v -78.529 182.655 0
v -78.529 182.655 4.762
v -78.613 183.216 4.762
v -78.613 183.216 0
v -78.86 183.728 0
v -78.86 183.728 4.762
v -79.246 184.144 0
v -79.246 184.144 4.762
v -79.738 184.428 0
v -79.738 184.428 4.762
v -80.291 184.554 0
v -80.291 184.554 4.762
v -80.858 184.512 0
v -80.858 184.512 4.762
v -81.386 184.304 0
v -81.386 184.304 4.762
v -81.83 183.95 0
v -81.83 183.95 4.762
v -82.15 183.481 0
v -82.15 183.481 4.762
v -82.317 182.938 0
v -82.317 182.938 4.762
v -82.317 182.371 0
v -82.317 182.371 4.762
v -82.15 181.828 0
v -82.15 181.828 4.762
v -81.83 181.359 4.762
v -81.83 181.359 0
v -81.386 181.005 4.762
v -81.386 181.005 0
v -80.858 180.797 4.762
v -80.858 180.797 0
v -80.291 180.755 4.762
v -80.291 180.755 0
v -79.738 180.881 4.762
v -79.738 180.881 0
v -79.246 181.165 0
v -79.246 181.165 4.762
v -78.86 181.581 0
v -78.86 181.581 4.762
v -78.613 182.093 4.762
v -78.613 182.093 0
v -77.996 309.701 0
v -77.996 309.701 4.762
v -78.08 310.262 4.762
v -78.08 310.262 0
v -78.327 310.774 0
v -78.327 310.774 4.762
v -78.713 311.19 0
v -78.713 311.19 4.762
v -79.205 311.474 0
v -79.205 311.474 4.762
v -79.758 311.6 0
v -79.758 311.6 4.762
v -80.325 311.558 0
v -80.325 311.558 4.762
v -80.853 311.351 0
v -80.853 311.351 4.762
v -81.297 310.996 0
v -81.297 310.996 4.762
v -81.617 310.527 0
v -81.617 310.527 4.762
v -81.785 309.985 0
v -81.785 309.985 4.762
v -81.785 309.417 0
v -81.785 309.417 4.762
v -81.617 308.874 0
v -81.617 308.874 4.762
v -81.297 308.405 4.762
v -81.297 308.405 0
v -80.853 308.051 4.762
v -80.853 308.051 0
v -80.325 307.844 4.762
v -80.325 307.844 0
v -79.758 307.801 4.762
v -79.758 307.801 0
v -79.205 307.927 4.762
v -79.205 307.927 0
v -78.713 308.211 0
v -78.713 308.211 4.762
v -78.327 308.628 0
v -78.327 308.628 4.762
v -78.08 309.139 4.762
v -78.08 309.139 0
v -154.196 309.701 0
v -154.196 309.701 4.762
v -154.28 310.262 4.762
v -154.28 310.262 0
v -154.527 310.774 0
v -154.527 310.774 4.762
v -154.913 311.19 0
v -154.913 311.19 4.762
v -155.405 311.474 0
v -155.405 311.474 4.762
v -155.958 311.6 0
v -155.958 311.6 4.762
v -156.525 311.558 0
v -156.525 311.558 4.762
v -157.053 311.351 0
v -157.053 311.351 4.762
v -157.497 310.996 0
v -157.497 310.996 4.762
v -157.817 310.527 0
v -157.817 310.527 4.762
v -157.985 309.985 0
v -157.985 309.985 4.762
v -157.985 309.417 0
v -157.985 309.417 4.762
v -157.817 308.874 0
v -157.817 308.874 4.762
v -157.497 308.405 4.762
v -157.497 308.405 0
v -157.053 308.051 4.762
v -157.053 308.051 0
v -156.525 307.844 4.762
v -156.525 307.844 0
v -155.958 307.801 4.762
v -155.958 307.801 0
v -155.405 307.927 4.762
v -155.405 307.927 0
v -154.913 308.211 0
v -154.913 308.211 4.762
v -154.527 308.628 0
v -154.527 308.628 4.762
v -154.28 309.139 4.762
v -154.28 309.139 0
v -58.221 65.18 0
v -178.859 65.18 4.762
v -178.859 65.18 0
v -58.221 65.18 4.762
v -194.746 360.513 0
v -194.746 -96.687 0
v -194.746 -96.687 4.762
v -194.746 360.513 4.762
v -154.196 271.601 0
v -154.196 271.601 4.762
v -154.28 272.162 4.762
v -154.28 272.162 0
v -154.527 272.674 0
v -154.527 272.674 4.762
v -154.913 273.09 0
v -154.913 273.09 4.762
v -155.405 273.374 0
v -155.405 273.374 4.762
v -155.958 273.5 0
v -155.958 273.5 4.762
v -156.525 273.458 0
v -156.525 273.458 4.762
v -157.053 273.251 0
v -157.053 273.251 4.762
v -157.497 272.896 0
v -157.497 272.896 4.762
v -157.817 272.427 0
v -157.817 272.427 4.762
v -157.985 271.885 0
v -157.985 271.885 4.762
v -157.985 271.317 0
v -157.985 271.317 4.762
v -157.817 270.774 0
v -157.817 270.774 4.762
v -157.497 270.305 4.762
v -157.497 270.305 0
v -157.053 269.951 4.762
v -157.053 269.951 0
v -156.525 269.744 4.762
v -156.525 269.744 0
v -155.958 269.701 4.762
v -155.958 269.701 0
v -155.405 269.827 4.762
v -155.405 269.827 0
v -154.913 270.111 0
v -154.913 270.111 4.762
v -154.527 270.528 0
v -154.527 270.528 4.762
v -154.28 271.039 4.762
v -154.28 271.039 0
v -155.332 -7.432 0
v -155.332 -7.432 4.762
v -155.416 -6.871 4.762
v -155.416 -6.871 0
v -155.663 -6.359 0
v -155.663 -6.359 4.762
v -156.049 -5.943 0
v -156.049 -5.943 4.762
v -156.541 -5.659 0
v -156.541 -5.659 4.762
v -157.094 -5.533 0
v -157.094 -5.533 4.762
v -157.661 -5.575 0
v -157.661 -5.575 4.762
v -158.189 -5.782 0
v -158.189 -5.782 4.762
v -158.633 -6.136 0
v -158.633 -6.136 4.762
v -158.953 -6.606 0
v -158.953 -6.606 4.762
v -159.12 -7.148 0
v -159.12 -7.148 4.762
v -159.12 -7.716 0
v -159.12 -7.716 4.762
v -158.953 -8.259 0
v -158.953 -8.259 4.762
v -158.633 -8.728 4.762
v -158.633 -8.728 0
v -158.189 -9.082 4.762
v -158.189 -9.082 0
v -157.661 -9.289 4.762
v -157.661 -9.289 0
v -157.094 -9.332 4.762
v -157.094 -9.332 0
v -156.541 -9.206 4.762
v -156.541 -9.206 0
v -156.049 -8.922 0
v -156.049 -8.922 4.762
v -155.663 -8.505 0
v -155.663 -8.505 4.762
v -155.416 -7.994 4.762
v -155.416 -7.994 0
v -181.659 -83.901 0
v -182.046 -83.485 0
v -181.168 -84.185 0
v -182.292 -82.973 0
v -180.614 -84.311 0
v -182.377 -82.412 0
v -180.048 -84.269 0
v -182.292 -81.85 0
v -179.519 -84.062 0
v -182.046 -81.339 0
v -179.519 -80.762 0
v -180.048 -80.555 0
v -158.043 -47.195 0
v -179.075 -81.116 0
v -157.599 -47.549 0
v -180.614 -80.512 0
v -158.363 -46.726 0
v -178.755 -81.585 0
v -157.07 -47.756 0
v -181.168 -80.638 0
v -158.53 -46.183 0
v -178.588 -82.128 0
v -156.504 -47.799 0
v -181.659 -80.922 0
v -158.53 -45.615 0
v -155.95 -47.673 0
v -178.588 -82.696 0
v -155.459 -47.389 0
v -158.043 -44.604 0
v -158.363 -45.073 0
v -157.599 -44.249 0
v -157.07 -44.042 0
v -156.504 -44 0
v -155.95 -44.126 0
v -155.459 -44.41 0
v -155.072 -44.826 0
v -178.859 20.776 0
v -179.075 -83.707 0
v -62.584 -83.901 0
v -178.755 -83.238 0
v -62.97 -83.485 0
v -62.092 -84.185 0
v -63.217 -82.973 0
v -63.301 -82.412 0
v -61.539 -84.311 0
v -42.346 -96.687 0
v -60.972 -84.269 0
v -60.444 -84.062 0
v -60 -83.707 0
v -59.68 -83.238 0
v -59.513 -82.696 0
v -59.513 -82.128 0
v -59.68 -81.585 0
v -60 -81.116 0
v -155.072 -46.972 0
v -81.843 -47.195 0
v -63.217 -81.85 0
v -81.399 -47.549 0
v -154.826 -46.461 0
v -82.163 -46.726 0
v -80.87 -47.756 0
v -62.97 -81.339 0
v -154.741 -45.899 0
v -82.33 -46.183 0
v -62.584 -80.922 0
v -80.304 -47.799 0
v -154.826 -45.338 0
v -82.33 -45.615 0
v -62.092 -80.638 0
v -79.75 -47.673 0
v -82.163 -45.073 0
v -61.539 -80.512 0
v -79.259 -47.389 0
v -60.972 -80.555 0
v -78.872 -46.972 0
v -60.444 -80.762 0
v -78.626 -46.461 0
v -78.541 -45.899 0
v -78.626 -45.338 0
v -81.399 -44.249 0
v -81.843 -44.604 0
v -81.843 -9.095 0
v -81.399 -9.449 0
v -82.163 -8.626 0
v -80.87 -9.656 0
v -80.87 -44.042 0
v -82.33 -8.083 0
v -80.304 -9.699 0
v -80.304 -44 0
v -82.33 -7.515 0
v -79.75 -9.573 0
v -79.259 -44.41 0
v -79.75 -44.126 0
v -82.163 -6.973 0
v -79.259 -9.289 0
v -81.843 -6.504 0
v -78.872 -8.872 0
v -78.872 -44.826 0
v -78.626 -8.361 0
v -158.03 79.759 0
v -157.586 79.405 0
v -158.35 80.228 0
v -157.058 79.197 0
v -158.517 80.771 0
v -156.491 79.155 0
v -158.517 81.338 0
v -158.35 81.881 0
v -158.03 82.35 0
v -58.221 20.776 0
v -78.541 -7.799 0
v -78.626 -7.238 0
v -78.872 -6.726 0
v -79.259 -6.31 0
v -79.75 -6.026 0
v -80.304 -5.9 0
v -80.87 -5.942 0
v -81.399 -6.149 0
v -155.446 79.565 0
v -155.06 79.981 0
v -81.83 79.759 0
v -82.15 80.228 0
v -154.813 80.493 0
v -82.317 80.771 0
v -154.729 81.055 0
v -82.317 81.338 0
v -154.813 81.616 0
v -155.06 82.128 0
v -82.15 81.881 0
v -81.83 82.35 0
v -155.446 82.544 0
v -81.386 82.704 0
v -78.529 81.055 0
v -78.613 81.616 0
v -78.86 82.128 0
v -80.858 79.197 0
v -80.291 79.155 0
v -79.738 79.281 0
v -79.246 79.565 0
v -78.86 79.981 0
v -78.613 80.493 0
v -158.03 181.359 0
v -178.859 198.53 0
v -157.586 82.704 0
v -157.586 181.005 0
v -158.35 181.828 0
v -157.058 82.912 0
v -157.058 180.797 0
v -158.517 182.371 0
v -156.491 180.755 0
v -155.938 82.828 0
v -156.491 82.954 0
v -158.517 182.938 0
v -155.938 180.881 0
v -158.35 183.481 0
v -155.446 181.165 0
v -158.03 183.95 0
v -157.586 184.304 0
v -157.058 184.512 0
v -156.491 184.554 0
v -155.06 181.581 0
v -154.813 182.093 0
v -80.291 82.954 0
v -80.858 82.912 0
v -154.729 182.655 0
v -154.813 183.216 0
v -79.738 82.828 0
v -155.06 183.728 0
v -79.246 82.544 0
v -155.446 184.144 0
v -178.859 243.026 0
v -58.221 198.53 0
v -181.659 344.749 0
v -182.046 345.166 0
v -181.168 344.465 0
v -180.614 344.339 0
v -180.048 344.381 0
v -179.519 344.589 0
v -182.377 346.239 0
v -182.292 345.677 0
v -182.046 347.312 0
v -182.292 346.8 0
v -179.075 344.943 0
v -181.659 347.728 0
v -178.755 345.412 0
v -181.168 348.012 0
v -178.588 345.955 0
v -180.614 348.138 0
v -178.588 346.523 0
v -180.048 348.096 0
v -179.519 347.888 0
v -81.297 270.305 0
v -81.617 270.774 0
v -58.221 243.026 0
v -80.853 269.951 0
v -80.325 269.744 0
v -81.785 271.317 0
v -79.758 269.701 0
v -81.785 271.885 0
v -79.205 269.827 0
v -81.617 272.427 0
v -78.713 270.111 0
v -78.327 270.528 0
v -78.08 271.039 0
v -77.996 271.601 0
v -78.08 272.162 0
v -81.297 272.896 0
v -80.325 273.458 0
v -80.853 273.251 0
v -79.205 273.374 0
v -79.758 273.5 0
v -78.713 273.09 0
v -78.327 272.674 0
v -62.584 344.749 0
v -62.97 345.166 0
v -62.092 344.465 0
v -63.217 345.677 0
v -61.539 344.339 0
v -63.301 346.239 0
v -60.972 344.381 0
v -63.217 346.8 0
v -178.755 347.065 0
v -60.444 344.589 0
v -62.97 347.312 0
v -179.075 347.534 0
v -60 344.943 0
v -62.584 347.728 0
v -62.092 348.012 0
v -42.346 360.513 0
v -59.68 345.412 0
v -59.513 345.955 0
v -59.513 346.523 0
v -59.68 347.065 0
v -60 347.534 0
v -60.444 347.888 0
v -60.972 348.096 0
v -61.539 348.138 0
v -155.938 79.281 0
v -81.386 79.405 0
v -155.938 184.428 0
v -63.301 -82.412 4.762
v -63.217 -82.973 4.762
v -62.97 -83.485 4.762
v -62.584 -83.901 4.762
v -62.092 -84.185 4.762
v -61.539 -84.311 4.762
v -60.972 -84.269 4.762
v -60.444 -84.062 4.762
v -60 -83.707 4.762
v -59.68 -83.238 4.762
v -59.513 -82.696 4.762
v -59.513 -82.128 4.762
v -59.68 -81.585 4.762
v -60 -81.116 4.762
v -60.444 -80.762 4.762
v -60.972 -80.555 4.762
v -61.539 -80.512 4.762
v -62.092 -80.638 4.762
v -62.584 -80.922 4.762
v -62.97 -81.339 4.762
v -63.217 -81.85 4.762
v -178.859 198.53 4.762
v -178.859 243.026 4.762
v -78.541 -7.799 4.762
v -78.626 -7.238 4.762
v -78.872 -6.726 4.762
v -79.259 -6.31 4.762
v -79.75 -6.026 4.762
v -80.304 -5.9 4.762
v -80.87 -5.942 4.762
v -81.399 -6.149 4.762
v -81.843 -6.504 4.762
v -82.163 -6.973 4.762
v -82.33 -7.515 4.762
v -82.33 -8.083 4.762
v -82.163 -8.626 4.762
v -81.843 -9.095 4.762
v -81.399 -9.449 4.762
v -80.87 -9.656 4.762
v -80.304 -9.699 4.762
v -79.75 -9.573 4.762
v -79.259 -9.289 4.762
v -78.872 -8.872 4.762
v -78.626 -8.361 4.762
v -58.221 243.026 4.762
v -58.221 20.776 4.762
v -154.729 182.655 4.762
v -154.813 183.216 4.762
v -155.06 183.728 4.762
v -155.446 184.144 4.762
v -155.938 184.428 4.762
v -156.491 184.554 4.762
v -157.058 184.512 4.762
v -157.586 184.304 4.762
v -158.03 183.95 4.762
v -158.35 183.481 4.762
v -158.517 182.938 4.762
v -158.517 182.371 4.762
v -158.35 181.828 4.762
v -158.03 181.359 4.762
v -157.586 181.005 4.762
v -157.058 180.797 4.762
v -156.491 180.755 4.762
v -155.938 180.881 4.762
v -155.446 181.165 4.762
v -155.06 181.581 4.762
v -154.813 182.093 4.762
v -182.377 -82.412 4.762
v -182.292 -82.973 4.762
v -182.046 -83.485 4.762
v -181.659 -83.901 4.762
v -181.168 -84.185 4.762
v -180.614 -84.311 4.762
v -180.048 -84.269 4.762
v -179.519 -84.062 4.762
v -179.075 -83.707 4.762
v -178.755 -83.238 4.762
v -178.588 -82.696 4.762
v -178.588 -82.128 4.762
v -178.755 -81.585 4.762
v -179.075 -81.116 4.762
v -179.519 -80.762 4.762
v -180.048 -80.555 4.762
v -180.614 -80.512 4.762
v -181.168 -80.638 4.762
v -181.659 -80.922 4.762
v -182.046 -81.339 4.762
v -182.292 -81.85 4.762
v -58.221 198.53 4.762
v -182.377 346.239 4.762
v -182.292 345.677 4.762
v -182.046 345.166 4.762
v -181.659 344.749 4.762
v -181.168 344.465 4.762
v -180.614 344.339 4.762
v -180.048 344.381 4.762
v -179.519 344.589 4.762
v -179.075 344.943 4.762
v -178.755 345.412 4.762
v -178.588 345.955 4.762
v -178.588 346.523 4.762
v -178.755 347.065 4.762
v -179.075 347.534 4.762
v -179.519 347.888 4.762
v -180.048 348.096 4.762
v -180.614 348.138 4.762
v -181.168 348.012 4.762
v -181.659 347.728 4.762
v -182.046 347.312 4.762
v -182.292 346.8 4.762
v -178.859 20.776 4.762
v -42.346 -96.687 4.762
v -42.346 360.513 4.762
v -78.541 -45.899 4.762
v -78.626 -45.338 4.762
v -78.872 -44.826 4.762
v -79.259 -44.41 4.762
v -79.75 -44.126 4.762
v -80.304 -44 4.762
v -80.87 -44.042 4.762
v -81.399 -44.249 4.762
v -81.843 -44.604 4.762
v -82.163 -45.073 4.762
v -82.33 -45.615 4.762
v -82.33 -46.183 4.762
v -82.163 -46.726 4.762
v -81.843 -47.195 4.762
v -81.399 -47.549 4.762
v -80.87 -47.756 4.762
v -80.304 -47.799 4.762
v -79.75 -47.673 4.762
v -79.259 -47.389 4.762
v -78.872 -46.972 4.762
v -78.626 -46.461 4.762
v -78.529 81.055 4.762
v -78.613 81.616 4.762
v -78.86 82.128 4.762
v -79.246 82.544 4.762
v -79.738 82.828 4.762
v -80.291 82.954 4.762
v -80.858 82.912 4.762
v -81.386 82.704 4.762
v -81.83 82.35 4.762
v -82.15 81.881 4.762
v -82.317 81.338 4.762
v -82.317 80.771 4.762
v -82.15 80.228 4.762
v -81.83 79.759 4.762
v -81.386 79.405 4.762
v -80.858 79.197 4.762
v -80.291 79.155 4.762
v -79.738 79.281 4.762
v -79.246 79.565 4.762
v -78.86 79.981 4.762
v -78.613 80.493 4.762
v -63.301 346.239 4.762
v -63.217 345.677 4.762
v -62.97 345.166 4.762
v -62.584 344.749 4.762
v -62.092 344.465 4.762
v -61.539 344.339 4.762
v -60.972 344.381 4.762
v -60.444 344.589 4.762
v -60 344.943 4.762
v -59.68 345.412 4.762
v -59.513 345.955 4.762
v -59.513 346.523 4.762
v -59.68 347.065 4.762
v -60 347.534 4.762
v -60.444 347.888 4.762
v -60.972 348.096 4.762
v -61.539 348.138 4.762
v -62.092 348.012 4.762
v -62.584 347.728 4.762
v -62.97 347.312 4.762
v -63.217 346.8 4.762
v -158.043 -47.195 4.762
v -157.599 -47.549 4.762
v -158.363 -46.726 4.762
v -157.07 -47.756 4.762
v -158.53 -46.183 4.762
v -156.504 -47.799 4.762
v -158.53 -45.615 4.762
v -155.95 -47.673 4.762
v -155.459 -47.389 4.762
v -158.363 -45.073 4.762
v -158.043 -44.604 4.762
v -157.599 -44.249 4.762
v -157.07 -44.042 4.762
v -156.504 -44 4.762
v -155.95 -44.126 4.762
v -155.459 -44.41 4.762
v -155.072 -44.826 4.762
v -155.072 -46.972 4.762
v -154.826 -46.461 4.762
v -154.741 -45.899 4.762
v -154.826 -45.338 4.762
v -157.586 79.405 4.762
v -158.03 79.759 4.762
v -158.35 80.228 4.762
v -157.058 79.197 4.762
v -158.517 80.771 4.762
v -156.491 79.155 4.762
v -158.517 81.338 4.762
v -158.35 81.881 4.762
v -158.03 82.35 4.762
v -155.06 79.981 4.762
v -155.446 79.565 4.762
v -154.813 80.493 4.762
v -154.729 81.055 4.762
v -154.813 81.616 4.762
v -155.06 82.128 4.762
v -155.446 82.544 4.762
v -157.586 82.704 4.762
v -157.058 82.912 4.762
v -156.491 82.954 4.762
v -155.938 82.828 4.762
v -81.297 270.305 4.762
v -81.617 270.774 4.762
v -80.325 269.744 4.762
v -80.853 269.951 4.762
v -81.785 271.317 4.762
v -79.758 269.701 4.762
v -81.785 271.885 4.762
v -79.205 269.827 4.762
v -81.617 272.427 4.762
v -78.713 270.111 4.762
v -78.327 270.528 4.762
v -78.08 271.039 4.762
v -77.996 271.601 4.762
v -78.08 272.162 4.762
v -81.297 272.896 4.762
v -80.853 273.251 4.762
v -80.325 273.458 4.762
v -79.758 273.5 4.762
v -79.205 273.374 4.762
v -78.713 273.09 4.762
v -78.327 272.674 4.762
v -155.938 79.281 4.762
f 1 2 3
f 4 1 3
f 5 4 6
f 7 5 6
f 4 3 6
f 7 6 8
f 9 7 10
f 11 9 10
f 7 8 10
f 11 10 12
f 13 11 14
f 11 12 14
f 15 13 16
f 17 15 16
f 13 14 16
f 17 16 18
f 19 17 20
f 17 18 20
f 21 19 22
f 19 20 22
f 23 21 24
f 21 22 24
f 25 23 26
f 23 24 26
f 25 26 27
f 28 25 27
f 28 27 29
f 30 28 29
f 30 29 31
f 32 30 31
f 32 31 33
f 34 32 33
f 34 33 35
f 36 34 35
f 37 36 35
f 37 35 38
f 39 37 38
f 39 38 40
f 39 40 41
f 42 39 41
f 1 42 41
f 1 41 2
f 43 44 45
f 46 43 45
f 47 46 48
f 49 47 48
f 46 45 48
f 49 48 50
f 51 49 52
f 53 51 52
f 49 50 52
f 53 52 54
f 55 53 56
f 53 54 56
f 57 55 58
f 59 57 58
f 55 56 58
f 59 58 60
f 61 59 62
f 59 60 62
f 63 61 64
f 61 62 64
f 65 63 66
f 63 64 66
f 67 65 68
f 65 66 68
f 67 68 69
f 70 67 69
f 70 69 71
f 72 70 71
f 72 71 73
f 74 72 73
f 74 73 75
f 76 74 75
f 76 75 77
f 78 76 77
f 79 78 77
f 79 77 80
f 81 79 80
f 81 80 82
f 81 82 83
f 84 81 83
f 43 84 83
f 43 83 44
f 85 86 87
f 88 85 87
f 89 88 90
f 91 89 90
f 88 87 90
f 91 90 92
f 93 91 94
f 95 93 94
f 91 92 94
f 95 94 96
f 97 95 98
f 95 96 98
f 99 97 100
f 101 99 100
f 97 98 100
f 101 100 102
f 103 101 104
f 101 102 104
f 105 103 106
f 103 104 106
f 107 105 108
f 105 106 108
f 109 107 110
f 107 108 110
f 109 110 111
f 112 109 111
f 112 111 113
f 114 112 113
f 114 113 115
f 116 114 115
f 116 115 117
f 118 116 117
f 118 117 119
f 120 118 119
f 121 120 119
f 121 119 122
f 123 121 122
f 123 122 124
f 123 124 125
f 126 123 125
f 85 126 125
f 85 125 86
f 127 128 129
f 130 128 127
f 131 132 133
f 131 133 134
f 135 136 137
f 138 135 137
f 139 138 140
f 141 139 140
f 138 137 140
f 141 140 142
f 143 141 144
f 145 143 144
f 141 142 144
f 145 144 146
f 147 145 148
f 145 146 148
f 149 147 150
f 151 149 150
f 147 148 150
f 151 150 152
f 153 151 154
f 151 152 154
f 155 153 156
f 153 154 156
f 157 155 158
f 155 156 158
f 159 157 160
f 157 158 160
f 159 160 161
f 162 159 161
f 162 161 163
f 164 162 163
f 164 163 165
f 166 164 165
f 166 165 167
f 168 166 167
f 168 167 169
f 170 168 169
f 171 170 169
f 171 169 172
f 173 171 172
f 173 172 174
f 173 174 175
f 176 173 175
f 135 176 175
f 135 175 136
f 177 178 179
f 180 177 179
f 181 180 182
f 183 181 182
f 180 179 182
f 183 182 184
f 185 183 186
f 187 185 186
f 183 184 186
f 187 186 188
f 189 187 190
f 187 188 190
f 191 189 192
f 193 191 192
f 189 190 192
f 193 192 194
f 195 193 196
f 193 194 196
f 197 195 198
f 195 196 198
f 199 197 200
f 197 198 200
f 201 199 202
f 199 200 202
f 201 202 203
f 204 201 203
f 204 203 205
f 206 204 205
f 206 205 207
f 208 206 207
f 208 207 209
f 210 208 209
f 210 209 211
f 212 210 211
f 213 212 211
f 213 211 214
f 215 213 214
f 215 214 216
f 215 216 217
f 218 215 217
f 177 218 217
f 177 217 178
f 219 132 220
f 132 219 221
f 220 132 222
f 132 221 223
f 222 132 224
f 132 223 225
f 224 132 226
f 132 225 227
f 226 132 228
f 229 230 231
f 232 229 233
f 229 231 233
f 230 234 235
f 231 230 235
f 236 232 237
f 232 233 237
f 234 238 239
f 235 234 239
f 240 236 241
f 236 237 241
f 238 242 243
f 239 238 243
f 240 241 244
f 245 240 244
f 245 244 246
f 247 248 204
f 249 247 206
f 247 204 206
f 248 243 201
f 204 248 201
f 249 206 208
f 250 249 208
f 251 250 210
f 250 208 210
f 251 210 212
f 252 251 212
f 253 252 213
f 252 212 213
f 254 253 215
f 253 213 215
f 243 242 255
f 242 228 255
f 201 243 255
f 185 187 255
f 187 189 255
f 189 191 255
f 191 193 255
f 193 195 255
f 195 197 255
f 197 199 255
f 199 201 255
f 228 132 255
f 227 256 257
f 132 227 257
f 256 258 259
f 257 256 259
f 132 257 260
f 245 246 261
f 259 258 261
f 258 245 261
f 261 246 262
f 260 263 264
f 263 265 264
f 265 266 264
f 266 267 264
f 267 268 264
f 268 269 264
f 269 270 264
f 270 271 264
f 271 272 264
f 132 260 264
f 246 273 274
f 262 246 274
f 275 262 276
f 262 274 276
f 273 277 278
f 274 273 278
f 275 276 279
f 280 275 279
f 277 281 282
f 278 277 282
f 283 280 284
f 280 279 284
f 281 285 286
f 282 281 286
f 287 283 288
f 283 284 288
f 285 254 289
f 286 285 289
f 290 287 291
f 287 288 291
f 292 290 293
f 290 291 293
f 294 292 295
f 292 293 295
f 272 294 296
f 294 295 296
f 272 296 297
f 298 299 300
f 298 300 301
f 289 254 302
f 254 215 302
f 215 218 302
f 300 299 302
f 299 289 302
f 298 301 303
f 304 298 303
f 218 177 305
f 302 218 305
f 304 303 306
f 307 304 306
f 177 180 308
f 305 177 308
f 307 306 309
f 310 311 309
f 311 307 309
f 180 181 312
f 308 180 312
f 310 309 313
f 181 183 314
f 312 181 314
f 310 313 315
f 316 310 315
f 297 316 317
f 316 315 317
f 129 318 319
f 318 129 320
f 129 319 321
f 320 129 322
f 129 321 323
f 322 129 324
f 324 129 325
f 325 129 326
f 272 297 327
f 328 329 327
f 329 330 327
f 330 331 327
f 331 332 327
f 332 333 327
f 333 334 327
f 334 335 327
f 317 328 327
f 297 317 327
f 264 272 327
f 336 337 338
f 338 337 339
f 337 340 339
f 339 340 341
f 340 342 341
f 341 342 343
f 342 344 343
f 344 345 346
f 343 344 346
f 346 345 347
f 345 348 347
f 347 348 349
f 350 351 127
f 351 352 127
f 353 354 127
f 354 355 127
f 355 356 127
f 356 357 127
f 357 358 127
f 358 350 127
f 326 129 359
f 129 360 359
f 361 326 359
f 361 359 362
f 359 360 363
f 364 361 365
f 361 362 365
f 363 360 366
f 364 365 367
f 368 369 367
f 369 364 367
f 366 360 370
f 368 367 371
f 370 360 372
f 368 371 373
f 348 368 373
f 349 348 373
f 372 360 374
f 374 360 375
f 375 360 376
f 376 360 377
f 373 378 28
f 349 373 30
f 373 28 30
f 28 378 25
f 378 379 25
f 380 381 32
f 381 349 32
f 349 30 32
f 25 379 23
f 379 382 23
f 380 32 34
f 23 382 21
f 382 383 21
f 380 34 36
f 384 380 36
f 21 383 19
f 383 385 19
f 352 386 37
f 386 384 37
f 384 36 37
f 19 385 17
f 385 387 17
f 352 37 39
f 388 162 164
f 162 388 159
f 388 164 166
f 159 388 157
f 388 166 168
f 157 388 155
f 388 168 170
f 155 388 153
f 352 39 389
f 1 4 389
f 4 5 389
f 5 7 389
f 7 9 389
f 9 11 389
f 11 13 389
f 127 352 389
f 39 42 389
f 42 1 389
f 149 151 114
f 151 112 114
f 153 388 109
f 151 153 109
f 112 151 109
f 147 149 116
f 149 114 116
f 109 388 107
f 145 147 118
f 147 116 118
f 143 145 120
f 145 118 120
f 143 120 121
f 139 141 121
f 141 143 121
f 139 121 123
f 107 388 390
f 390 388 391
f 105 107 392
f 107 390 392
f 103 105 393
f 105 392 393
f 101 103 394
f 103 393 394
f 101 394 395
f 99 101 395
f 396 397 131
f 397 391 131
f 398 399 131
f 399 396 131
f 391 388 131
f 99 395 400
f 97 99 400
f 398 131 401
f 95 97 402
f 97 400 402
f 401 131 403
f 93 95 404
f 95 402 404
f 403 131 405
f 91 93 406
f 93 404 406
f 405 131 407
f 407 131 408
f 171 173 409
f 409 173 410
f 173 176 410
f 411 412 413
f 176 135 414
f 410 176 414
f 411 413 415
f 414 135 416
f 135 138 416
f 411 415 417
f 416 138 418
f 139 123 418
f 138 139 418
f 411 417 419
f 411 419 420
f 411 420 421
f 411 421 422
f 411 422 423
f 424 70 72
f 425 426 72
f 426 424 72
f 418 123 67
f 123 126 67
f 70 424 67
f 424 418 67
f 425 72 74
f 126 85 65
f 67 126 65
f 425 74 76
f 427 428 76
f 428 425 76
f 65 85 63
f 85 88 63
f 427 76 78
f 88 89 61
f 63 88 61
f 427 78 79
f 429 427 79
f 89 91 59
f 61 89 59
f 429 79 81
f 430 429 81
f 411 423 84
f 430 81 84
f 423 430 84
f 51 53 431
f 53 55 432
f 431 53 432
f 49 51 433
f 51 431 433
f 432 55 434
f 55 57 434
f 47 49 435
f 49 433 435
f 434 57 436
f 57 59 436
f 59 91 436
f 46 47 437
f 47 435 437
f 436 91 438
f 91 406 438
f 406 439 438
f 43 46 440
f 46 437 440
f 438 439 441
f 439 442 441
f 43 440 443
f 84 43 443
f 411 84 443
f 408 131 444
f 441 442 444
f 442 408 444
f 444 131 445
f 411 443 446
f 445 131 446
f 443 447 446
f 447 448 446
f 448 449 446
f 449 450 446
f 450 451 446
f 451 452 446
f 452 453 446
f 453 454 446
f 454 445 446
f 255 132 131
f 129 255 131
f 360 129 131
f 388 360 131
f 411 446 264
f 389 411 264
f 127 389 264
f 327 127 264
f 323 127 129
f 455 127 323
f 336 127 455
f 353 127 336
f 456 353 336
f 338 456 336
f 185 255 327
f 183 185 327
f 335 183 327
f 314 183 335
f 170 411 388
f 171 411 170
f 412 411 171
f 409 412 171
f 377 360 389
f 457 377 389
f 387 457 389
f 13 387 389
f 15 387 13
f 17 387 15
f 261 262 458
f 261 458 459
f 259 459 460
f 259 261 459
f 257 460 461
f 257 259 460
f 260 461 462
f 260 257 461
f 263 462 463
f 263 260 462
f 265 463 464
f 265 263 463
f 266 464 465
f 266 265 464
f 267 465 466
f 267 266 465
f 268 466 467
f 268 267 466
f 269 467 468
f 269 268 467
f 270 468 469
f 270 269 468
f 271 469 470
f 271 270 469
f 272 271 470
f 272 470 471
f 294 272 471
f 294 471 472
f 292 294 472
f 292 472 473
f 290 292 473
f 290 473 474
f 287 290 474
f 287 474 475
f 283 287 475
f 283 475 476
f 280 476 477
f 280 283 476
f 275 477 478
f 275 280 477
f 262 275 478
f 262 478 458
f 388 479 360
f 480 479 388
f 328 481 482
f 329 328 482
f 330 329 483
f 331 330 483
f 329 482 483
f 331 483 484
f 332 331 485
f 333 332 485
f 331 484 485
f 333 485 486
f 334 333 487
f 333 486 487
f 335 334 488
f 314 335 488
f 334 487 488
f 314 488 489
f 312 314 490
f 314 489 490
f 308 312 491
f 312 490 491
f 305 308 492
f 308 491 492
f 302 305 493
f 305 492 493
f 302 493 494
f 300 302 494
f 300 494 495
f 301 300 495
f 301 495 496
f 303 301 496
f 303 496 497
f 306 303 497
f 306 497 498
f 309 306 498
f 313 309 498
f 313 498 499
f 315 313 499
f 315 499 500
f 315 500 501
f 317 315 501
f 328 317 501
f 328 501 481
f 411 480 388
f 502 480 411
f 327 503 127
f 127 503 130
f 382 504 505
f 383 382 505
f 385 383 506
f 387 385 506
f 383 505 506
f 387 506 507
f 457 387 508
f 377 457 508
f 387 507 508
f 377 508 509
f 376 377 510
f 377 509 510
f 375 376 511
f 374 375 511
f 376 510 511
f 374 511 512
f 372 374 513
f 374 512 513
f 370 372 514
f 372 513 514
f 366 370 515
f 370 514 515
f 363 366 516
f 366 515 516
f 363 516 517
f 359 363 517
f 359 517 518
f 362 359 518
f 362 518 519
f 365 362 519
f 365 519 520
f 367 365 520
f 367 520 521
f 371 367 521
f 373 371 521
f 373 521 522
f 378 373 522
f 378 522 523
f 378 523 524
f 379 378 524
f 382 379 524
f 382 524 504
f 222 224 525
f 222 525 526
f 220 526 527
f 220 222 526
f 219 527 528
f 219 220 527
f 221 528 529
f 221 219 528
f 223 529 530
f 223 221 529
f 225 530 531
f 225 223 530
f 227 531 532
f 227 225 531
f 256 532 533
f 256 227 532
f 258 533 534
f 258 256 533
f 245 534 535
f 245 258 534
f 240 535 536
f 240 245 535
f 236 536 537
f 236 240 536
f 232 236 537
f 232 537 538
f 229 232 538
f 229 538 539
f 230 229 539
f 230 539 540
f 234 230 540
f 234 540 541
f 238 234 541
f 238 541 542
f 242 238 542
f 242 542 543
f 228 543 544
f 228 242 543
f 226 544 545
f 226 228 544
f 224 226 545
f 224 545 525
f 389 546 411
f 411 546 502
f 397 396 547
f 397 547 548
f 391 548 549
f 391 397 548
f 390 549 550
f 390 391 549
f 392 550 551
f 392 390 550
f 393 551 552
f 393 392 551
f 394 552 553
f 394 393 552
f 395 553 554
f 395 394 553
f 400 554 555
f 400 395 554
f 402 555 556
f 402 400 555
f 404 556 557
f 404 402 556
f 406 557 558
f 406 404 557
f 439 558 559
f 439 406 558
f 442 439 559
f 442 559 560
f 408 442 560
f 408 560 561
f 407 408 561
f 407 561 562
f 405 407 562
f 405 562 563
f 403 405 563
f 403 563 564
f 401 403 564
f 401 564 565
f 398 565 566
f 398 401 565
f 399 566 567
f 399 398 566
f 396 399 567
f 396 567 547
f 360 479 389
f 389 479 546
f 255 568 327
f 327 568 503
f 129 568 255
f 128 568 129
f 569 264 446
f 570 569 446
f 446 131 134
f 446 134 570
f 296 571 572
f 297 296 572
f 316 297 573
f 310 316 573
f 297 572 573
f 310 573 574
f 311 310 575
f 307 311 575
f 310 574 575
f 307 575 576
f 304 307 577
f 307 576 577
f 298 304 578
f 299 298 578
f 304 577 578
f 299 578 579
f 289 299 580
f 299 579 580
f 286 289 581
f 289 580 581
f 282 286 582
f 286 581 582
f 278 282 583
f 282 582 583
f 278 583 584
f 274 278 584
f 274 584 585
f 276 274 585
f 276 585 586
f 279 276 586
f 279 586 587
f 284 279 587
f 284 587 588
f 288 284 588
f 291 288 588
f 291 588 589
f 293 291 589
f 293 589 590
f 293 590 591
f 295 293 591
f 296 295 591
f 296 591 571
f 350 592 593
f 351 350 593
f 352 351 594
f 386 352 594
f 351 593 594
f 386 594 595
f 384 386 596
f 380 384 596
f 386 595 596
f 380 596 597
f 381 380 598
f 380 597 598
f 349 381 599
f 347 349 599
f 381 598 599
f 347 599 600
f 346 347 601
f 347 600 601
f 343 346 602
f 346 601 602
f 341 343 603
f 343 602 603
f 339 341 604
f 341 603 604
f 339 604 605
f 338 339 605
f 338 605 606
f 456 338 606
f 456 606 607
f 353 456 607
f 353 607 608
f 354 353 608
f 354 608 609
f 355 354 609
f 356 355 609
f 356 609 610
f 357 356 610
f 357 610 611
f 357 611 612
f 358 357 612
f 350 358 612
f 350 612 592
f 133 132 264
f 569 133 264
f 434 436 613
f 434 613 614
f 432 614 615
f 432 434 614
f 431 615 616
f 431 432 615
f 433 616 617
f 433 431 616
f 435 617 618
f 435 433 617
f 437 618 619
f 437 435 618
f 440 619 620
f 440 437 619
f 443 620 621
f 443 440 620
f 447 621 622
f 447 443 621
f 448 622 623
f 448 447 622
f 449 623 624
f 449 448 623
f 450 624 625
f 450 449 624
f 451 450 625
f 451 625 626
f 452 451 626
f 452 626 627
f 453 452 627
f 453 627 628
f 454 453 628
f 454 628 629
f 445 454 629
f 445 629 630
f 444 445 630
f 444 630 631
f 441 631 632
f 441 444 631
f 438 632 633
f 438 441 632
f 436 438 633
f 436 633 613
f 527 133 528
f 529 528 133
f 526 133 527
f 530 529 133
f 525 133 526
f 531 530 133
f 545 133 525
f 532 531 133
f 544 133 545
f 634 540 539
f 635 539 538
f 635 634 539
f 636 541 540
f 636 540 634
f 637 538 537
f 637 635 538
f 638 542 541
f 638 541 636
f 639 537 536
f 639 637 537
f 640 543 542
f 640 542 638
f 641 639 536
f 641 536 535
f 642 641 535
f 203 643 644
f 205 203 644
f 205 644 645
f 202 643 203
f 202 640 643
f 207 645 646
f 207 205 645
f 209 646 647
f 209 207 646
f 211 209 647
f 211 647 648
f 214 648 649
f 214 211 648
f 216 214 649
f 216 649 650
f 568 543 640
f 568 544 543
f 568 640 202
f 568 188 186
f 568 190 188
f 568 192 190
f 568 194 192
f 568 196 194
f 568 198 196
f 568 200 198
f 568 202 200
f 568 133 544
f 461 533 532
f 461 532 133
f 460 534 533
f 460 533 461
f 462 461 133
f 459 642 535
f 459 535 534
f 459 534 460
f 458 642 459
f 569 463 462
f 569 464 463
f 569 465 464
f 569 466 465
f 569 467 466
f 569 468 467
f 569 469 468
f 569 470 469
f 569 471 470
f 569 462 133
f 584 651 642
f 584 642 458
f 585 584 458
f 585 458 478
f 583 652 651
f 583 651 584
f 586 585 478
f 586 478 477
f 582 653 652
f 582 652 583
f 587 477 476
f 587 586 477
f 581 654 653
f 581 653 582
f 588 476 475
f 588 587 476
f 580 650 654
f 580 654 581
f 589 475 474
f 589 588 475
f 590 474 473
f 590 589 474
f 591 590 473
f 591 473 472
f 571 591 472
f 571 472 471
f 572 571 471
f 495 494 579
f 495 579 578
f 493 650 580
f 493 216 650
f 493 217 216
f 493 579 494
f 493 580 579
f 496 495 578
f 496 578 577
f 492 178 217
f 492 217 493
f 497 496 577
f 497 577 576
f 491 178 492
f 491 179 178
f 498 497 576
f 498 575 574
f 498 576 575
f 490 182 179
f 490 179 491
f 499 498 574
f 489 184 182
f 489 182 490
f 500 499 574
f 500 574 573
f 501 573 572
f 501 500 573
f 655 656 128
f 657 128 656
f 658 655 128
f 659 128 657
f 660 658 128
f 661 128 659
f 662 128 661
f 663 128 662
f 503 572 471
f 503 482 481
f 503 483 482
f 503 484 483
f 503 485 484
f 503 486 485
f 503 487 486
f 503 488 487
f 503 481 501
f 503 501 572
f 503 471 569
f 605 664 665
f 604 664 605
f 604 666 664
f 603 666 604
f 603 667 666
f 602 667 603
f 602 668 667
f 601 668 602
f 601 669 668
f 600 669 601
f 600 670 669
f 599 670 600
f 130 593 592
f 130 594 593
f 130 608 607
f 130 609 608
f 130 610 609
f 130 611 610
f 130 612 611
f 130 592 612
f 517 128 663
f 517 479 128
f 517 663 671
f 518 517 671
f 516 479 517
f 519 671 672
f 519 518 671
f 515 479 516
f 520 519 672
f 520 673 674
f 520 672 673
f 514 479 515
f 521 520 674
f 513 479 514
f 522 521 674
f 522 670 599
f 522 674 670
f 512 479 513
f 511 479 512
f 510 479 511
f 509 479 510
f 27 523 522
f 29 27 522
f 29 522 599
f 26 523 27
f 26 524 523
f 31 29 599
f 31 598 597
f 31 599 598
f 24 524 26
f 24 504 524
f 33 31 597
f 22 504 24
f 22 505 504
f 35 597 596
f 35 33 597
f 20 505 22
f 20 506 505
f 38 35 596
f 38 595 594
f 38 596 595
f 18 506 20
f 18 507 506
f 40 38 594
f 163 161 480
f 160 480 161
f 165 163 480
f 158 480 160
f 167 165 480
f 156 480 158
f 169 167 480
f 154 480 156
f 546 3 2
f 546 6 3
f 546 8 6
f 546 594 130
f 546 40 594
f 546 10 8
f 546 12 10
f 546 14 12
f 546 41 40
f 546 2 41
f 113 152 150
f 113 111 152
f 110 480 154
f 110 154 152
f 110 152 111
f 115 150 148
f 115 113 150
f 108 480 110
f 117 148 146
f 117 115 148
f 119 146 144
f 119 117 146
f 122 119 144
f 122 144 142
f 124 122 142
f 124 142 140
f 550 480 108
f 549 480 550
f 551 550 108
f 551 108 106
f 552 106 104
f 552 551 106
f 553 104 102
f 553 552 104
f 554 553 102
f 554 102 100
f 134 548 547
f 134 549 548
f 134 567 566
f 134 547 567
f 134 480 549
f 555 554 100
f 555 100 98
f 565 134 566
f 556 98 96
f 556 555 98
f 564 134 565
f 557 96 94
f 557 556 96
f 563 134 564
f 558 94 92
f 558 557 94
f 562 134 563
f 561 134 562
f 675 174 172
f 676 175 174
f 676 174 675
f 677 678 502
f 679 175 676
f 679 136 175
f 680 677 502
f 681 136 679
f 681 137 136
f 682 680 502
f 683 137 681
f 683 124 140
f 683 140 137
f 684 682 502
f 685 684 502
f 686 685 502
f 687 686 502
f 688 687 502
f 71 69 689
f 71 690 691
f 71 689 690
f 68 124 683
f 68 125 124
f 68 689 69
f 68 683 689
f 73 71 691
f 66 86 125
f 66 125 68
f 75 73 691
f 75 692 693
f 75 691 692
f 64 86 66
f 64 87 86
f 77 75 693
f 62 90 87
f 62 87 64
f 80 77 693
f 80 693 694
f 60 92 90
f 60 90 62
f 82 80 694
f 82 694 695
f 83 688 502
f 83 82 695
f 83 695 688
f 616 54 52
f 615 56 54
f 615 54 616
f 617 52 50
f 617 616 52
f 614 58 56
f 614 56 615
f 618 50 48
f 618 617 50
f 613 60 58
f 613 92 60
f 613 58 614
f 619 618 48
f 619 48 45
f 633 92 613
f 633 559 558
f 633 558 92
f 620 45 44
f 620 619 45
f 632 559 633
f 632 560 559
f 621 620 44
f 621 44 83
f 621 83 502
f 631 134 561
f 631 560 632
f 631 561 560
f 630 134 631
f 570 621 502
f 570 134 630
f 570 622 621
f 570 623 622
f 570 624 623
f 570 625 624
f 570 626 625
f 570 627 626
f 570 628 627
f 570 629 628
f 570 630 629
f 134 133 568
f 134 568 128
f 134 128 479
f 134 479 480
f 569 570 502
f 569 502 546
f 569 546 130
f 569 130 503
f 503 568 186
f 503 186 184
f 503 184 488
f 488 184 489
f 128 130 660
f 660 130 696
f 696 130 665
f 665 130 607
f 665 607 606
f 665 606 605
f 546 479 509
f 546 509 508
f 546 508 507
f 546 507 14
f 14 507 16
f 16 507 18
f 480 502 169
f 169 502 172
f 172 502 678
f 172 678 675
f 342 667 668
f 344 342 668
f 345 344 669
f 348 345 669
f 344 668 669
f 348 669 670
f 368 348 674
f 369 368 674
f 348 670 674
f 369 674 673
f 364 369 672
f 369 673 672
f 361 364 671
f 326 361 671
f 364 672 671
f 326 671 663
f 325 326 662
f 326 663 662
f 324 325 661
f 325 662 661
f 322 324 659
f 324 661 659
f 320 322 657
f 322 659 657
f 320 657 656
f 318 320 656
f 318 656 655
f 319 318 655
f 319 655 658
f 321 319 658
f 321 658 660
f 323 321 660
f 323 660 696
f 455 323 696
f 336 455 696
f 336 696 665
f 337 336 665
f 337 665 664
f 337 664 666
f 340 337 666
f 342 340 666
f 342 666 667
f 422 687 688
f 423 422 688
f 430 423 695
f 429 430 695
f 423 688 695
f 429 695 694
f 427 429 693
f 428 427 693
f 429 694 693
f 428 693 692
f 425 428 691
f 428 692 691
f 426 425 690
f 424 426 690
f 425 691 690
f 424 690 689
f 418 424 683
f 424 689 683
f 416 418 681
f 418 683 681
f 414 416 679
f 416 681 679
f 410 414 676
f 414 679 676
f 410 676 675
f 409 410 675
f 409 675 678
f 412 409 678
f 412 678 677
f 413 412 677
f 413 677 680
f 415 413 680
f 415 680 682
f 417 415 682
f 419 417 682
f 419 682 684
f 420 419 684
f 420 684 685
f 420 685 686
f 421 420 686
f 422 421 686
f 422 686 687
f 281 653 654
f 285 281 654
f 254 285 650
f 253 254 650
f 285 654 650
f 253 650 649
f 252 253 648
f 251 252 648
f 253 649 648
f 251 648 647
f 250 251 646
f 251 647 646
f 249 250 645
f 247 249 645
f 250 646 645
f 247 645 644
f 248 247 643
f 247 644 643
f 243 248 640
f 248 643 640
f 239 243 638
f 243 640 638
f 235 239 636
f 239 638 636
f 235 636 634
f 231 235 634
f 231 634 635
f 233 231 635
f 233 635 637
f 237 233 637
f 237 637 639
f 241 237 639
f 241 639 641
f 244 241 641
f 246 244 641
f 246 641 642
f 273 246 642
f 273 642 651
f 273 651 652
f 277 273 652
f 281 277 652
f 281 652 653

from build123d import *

# Parameters (mm, degrees)
SKETCH1_W           = 152.4
SKETCH1_H           = 457.2
SKETCH1_R           = 1.905
BOSS_EXTRUDE1_DEPTH = 4.7625
CUT_EXTRUDE1_REACH  = 411.779
SKETCH3_R           = 1.905
CUT_EXTRUDE4_REACH  = 411.779
SKETCH6_W           = 120.6373
SKETCH6_H           = 44.403792
SKETCH6_H_2         = 44.496208
SKETCH7_R           = 1.905
CUT_EXTRUDE5_DEPTH  = 410.778918528


with BuildPart() as part:
    # Sketch1 → Boss-Extrude1 (new body)
    with BuildSketch(Plane.XY):
        with Locations((-118.546343616, 131.913442623)):
            Rectangle(SKETCH1_W, SKETCH1_H)
        with Locations(Location((-61.396343616, 346.238642623, 0), (0, 0, 180))):
            Circle(SKETCH1_R, mode=Mode.SUBTRACT)
        with Locations(Location((-180.471543616, 346.238642623, 0), (0, 0, 180))):
            Circle(SKETCH1_R, mode=Mode.SUBTRACT)
        with Locations(Location((-180.471543616, -82.411757377, 0), (0, 0, 180))):
            Circle(SKETCH1_R, mode=Mode.SUBTRACT)
        with Locations(Location((-61.396343616, -82.411757377, 0), (0, 0, 180))):
            Circle(SKETCH1_R, mode=Mode.SUBTRACT)
    extrude(amount=BOSS_EXTRUDE1_DEPTH)

    # Sketch3 → Cut-Extrude1 (cut, up to next)
    with BuildSketch(Plane.XY.offset(4.7625), mode=Mode.PRIVATE) as cut_extrude1_sk1:
        with Locations((-156.633643616, 182.654534623)):
            Circle(SKETCH3_R)
    cut_extrude1_tool1 = extrude(cut_extrude1_sk1.sketch, amount=-CUT_EXTRUDE1_REACH, mode=Mode.PRIVATE) & part.part
    # Sketch3 → Cut-Extrude1 (cut, up to next)
    with BuildSketch(Plane.XY.offset(4.7625), mode=Mode.PRIVATE) as cut_extrude1_sk2:
        with Locations((-80.433643616, 182.654534623)):
            Circle(SKETCH3_R)
    cut_extrude1_tool2 = extrude(cut_extrude1_sk2.sketch, amount=-CUT_EXTRUDE1_REACH, mode=Mode.PRIVATE) & part.part
    # Sketch3 → Cut-Extrude1 (cut, up to next)
    with BuildSketch(Plane.XY.offset(4.7625), mode=Mode.PRIVATE) as cut_extrude1_sk3:
        with Locations((-156.633643616, 81.054534623)):
            Circle(SKETCH3_R)
    cut_extrude1_tool3 = extrude(cut_extrude1_sk3.sketch, amount=-CUT_EXTRUDE1_REACH, mode=Mode.PRIVATE) & part.part
    # Sketch3 → Cut-Extrude1 (cut, up to next)
    with BuildSketch(Plane.XY.offset(4.7625), mode=Mode.PRIVATE) as cut_extrude1_sk4:
        with Locations((-80.433643616, 81.054534623)):
            Circle(SKETCH3_R)
    cut_extrude1_tool4 = extrude(cut_extrude1_sk4.sketch, amount=-CUT_EXTRUDE1_REACH, mode=Mode.PRIVATE) & part.part
    add(cut_extrude1_tool1.solids().sort_by_distance((-156.633644, 182.654535, 4.7625))[0], mode=Mode.SUBTRACT)
    add(cut_extrude1_tool2.solids().sort_by_distance((-80.433644, 182.654535, 4.7625))[0], mode=Mode.SUBTRACT)
    add(cut_extrude1_tool3.solids().sort_by_distance((-156.633644, 81.054535, 4.7625))[0], mode=Mode.SUBTRACT)
    add(cut_extrude1_tool4.solids().sort_by_distance((-80.433644, 81.054535, 4.7625))[0], mode=Mode.SUBTRACT)

    # Sketch6 → Cut-Extrude4 (cut, up to next)
    with BuildSketch(Plane.XY.offset(4.7625), mode=Mode.PRIVATE) as cut_extrude4_sk1:
        with Locations((-118.539993616, 42.977638623)):
            Rectangle(SKETCH6_W, SKETCH6_H)
    cut_extrude4_tool1 = extrude(cut_extrude4_sk1.sketch, amount=-CUT_EXTRUDE4_REACH, mode=Mode.PRIVATE) & part.part
    # Sketch6 → Cut-Extrude4 (cut, up to next)
    with BuildSketch(Plane.XY.offset(4.7625), mode=Mode.PRIVATE) as cut_extrude4_sk2:
        with Locations((-118.539993616, 220.777638623)):
            Rectangle(SKETCH6_W, SKETCH6_H_2)
    cut_extrude4_tool2 = extrude(cut_extrude4_sk2.sketch, amount=-CUT_EXTRUDE4_REACH, mode=Mode.PRIVATE) & part.part
    add(cut_extrude4_tool1.solids().sort_by_distance((-118.539994, 42.977639, 4.7625))[0], mode=Mode.SUBTRACT)
    add(cut_extrude4_tool2.solids().sort_by_distance((-118.539994, 220.777639, 4.7625))[0], mode=Mode.SUBTRACT)

    # Sketch7 → Cut-Extrude5 (cut, through all)
    with BuildSketch(Plane.XY.offset(4.7625)):
        with Locations((-157.236735827, -7.432198967)):
            Circle(SKETCH7_R)
        with Locations((-156.646343616, -45.899257377)):
            Circle(SKETCH7_R)
        with Locations((-80.446343616, -45.899257377)):
            Circle(SKETCH7_R)
        with Locations((-80.446343616, -7.799257377)):
            Circle(SKETCH7_R)
        with Locations((-79.900784131, 271.600742623)):
            Circle(SKETCH7_R)
        with Locations((-79.900784131, 309.700742623)):
            Circle(SKETCH7_R)
        with Locations((-156.100784131, 309.700742623)):
            Circle(SKETCH7_R)
        with Locations((-156.100784131, 271.600742623)):
            Circle(SKETCH7_R)
    extrude(amount=-CUT_EXTRUDE5_DEPTH, mode=Mode.SUBTRACT)


solid = part.part
